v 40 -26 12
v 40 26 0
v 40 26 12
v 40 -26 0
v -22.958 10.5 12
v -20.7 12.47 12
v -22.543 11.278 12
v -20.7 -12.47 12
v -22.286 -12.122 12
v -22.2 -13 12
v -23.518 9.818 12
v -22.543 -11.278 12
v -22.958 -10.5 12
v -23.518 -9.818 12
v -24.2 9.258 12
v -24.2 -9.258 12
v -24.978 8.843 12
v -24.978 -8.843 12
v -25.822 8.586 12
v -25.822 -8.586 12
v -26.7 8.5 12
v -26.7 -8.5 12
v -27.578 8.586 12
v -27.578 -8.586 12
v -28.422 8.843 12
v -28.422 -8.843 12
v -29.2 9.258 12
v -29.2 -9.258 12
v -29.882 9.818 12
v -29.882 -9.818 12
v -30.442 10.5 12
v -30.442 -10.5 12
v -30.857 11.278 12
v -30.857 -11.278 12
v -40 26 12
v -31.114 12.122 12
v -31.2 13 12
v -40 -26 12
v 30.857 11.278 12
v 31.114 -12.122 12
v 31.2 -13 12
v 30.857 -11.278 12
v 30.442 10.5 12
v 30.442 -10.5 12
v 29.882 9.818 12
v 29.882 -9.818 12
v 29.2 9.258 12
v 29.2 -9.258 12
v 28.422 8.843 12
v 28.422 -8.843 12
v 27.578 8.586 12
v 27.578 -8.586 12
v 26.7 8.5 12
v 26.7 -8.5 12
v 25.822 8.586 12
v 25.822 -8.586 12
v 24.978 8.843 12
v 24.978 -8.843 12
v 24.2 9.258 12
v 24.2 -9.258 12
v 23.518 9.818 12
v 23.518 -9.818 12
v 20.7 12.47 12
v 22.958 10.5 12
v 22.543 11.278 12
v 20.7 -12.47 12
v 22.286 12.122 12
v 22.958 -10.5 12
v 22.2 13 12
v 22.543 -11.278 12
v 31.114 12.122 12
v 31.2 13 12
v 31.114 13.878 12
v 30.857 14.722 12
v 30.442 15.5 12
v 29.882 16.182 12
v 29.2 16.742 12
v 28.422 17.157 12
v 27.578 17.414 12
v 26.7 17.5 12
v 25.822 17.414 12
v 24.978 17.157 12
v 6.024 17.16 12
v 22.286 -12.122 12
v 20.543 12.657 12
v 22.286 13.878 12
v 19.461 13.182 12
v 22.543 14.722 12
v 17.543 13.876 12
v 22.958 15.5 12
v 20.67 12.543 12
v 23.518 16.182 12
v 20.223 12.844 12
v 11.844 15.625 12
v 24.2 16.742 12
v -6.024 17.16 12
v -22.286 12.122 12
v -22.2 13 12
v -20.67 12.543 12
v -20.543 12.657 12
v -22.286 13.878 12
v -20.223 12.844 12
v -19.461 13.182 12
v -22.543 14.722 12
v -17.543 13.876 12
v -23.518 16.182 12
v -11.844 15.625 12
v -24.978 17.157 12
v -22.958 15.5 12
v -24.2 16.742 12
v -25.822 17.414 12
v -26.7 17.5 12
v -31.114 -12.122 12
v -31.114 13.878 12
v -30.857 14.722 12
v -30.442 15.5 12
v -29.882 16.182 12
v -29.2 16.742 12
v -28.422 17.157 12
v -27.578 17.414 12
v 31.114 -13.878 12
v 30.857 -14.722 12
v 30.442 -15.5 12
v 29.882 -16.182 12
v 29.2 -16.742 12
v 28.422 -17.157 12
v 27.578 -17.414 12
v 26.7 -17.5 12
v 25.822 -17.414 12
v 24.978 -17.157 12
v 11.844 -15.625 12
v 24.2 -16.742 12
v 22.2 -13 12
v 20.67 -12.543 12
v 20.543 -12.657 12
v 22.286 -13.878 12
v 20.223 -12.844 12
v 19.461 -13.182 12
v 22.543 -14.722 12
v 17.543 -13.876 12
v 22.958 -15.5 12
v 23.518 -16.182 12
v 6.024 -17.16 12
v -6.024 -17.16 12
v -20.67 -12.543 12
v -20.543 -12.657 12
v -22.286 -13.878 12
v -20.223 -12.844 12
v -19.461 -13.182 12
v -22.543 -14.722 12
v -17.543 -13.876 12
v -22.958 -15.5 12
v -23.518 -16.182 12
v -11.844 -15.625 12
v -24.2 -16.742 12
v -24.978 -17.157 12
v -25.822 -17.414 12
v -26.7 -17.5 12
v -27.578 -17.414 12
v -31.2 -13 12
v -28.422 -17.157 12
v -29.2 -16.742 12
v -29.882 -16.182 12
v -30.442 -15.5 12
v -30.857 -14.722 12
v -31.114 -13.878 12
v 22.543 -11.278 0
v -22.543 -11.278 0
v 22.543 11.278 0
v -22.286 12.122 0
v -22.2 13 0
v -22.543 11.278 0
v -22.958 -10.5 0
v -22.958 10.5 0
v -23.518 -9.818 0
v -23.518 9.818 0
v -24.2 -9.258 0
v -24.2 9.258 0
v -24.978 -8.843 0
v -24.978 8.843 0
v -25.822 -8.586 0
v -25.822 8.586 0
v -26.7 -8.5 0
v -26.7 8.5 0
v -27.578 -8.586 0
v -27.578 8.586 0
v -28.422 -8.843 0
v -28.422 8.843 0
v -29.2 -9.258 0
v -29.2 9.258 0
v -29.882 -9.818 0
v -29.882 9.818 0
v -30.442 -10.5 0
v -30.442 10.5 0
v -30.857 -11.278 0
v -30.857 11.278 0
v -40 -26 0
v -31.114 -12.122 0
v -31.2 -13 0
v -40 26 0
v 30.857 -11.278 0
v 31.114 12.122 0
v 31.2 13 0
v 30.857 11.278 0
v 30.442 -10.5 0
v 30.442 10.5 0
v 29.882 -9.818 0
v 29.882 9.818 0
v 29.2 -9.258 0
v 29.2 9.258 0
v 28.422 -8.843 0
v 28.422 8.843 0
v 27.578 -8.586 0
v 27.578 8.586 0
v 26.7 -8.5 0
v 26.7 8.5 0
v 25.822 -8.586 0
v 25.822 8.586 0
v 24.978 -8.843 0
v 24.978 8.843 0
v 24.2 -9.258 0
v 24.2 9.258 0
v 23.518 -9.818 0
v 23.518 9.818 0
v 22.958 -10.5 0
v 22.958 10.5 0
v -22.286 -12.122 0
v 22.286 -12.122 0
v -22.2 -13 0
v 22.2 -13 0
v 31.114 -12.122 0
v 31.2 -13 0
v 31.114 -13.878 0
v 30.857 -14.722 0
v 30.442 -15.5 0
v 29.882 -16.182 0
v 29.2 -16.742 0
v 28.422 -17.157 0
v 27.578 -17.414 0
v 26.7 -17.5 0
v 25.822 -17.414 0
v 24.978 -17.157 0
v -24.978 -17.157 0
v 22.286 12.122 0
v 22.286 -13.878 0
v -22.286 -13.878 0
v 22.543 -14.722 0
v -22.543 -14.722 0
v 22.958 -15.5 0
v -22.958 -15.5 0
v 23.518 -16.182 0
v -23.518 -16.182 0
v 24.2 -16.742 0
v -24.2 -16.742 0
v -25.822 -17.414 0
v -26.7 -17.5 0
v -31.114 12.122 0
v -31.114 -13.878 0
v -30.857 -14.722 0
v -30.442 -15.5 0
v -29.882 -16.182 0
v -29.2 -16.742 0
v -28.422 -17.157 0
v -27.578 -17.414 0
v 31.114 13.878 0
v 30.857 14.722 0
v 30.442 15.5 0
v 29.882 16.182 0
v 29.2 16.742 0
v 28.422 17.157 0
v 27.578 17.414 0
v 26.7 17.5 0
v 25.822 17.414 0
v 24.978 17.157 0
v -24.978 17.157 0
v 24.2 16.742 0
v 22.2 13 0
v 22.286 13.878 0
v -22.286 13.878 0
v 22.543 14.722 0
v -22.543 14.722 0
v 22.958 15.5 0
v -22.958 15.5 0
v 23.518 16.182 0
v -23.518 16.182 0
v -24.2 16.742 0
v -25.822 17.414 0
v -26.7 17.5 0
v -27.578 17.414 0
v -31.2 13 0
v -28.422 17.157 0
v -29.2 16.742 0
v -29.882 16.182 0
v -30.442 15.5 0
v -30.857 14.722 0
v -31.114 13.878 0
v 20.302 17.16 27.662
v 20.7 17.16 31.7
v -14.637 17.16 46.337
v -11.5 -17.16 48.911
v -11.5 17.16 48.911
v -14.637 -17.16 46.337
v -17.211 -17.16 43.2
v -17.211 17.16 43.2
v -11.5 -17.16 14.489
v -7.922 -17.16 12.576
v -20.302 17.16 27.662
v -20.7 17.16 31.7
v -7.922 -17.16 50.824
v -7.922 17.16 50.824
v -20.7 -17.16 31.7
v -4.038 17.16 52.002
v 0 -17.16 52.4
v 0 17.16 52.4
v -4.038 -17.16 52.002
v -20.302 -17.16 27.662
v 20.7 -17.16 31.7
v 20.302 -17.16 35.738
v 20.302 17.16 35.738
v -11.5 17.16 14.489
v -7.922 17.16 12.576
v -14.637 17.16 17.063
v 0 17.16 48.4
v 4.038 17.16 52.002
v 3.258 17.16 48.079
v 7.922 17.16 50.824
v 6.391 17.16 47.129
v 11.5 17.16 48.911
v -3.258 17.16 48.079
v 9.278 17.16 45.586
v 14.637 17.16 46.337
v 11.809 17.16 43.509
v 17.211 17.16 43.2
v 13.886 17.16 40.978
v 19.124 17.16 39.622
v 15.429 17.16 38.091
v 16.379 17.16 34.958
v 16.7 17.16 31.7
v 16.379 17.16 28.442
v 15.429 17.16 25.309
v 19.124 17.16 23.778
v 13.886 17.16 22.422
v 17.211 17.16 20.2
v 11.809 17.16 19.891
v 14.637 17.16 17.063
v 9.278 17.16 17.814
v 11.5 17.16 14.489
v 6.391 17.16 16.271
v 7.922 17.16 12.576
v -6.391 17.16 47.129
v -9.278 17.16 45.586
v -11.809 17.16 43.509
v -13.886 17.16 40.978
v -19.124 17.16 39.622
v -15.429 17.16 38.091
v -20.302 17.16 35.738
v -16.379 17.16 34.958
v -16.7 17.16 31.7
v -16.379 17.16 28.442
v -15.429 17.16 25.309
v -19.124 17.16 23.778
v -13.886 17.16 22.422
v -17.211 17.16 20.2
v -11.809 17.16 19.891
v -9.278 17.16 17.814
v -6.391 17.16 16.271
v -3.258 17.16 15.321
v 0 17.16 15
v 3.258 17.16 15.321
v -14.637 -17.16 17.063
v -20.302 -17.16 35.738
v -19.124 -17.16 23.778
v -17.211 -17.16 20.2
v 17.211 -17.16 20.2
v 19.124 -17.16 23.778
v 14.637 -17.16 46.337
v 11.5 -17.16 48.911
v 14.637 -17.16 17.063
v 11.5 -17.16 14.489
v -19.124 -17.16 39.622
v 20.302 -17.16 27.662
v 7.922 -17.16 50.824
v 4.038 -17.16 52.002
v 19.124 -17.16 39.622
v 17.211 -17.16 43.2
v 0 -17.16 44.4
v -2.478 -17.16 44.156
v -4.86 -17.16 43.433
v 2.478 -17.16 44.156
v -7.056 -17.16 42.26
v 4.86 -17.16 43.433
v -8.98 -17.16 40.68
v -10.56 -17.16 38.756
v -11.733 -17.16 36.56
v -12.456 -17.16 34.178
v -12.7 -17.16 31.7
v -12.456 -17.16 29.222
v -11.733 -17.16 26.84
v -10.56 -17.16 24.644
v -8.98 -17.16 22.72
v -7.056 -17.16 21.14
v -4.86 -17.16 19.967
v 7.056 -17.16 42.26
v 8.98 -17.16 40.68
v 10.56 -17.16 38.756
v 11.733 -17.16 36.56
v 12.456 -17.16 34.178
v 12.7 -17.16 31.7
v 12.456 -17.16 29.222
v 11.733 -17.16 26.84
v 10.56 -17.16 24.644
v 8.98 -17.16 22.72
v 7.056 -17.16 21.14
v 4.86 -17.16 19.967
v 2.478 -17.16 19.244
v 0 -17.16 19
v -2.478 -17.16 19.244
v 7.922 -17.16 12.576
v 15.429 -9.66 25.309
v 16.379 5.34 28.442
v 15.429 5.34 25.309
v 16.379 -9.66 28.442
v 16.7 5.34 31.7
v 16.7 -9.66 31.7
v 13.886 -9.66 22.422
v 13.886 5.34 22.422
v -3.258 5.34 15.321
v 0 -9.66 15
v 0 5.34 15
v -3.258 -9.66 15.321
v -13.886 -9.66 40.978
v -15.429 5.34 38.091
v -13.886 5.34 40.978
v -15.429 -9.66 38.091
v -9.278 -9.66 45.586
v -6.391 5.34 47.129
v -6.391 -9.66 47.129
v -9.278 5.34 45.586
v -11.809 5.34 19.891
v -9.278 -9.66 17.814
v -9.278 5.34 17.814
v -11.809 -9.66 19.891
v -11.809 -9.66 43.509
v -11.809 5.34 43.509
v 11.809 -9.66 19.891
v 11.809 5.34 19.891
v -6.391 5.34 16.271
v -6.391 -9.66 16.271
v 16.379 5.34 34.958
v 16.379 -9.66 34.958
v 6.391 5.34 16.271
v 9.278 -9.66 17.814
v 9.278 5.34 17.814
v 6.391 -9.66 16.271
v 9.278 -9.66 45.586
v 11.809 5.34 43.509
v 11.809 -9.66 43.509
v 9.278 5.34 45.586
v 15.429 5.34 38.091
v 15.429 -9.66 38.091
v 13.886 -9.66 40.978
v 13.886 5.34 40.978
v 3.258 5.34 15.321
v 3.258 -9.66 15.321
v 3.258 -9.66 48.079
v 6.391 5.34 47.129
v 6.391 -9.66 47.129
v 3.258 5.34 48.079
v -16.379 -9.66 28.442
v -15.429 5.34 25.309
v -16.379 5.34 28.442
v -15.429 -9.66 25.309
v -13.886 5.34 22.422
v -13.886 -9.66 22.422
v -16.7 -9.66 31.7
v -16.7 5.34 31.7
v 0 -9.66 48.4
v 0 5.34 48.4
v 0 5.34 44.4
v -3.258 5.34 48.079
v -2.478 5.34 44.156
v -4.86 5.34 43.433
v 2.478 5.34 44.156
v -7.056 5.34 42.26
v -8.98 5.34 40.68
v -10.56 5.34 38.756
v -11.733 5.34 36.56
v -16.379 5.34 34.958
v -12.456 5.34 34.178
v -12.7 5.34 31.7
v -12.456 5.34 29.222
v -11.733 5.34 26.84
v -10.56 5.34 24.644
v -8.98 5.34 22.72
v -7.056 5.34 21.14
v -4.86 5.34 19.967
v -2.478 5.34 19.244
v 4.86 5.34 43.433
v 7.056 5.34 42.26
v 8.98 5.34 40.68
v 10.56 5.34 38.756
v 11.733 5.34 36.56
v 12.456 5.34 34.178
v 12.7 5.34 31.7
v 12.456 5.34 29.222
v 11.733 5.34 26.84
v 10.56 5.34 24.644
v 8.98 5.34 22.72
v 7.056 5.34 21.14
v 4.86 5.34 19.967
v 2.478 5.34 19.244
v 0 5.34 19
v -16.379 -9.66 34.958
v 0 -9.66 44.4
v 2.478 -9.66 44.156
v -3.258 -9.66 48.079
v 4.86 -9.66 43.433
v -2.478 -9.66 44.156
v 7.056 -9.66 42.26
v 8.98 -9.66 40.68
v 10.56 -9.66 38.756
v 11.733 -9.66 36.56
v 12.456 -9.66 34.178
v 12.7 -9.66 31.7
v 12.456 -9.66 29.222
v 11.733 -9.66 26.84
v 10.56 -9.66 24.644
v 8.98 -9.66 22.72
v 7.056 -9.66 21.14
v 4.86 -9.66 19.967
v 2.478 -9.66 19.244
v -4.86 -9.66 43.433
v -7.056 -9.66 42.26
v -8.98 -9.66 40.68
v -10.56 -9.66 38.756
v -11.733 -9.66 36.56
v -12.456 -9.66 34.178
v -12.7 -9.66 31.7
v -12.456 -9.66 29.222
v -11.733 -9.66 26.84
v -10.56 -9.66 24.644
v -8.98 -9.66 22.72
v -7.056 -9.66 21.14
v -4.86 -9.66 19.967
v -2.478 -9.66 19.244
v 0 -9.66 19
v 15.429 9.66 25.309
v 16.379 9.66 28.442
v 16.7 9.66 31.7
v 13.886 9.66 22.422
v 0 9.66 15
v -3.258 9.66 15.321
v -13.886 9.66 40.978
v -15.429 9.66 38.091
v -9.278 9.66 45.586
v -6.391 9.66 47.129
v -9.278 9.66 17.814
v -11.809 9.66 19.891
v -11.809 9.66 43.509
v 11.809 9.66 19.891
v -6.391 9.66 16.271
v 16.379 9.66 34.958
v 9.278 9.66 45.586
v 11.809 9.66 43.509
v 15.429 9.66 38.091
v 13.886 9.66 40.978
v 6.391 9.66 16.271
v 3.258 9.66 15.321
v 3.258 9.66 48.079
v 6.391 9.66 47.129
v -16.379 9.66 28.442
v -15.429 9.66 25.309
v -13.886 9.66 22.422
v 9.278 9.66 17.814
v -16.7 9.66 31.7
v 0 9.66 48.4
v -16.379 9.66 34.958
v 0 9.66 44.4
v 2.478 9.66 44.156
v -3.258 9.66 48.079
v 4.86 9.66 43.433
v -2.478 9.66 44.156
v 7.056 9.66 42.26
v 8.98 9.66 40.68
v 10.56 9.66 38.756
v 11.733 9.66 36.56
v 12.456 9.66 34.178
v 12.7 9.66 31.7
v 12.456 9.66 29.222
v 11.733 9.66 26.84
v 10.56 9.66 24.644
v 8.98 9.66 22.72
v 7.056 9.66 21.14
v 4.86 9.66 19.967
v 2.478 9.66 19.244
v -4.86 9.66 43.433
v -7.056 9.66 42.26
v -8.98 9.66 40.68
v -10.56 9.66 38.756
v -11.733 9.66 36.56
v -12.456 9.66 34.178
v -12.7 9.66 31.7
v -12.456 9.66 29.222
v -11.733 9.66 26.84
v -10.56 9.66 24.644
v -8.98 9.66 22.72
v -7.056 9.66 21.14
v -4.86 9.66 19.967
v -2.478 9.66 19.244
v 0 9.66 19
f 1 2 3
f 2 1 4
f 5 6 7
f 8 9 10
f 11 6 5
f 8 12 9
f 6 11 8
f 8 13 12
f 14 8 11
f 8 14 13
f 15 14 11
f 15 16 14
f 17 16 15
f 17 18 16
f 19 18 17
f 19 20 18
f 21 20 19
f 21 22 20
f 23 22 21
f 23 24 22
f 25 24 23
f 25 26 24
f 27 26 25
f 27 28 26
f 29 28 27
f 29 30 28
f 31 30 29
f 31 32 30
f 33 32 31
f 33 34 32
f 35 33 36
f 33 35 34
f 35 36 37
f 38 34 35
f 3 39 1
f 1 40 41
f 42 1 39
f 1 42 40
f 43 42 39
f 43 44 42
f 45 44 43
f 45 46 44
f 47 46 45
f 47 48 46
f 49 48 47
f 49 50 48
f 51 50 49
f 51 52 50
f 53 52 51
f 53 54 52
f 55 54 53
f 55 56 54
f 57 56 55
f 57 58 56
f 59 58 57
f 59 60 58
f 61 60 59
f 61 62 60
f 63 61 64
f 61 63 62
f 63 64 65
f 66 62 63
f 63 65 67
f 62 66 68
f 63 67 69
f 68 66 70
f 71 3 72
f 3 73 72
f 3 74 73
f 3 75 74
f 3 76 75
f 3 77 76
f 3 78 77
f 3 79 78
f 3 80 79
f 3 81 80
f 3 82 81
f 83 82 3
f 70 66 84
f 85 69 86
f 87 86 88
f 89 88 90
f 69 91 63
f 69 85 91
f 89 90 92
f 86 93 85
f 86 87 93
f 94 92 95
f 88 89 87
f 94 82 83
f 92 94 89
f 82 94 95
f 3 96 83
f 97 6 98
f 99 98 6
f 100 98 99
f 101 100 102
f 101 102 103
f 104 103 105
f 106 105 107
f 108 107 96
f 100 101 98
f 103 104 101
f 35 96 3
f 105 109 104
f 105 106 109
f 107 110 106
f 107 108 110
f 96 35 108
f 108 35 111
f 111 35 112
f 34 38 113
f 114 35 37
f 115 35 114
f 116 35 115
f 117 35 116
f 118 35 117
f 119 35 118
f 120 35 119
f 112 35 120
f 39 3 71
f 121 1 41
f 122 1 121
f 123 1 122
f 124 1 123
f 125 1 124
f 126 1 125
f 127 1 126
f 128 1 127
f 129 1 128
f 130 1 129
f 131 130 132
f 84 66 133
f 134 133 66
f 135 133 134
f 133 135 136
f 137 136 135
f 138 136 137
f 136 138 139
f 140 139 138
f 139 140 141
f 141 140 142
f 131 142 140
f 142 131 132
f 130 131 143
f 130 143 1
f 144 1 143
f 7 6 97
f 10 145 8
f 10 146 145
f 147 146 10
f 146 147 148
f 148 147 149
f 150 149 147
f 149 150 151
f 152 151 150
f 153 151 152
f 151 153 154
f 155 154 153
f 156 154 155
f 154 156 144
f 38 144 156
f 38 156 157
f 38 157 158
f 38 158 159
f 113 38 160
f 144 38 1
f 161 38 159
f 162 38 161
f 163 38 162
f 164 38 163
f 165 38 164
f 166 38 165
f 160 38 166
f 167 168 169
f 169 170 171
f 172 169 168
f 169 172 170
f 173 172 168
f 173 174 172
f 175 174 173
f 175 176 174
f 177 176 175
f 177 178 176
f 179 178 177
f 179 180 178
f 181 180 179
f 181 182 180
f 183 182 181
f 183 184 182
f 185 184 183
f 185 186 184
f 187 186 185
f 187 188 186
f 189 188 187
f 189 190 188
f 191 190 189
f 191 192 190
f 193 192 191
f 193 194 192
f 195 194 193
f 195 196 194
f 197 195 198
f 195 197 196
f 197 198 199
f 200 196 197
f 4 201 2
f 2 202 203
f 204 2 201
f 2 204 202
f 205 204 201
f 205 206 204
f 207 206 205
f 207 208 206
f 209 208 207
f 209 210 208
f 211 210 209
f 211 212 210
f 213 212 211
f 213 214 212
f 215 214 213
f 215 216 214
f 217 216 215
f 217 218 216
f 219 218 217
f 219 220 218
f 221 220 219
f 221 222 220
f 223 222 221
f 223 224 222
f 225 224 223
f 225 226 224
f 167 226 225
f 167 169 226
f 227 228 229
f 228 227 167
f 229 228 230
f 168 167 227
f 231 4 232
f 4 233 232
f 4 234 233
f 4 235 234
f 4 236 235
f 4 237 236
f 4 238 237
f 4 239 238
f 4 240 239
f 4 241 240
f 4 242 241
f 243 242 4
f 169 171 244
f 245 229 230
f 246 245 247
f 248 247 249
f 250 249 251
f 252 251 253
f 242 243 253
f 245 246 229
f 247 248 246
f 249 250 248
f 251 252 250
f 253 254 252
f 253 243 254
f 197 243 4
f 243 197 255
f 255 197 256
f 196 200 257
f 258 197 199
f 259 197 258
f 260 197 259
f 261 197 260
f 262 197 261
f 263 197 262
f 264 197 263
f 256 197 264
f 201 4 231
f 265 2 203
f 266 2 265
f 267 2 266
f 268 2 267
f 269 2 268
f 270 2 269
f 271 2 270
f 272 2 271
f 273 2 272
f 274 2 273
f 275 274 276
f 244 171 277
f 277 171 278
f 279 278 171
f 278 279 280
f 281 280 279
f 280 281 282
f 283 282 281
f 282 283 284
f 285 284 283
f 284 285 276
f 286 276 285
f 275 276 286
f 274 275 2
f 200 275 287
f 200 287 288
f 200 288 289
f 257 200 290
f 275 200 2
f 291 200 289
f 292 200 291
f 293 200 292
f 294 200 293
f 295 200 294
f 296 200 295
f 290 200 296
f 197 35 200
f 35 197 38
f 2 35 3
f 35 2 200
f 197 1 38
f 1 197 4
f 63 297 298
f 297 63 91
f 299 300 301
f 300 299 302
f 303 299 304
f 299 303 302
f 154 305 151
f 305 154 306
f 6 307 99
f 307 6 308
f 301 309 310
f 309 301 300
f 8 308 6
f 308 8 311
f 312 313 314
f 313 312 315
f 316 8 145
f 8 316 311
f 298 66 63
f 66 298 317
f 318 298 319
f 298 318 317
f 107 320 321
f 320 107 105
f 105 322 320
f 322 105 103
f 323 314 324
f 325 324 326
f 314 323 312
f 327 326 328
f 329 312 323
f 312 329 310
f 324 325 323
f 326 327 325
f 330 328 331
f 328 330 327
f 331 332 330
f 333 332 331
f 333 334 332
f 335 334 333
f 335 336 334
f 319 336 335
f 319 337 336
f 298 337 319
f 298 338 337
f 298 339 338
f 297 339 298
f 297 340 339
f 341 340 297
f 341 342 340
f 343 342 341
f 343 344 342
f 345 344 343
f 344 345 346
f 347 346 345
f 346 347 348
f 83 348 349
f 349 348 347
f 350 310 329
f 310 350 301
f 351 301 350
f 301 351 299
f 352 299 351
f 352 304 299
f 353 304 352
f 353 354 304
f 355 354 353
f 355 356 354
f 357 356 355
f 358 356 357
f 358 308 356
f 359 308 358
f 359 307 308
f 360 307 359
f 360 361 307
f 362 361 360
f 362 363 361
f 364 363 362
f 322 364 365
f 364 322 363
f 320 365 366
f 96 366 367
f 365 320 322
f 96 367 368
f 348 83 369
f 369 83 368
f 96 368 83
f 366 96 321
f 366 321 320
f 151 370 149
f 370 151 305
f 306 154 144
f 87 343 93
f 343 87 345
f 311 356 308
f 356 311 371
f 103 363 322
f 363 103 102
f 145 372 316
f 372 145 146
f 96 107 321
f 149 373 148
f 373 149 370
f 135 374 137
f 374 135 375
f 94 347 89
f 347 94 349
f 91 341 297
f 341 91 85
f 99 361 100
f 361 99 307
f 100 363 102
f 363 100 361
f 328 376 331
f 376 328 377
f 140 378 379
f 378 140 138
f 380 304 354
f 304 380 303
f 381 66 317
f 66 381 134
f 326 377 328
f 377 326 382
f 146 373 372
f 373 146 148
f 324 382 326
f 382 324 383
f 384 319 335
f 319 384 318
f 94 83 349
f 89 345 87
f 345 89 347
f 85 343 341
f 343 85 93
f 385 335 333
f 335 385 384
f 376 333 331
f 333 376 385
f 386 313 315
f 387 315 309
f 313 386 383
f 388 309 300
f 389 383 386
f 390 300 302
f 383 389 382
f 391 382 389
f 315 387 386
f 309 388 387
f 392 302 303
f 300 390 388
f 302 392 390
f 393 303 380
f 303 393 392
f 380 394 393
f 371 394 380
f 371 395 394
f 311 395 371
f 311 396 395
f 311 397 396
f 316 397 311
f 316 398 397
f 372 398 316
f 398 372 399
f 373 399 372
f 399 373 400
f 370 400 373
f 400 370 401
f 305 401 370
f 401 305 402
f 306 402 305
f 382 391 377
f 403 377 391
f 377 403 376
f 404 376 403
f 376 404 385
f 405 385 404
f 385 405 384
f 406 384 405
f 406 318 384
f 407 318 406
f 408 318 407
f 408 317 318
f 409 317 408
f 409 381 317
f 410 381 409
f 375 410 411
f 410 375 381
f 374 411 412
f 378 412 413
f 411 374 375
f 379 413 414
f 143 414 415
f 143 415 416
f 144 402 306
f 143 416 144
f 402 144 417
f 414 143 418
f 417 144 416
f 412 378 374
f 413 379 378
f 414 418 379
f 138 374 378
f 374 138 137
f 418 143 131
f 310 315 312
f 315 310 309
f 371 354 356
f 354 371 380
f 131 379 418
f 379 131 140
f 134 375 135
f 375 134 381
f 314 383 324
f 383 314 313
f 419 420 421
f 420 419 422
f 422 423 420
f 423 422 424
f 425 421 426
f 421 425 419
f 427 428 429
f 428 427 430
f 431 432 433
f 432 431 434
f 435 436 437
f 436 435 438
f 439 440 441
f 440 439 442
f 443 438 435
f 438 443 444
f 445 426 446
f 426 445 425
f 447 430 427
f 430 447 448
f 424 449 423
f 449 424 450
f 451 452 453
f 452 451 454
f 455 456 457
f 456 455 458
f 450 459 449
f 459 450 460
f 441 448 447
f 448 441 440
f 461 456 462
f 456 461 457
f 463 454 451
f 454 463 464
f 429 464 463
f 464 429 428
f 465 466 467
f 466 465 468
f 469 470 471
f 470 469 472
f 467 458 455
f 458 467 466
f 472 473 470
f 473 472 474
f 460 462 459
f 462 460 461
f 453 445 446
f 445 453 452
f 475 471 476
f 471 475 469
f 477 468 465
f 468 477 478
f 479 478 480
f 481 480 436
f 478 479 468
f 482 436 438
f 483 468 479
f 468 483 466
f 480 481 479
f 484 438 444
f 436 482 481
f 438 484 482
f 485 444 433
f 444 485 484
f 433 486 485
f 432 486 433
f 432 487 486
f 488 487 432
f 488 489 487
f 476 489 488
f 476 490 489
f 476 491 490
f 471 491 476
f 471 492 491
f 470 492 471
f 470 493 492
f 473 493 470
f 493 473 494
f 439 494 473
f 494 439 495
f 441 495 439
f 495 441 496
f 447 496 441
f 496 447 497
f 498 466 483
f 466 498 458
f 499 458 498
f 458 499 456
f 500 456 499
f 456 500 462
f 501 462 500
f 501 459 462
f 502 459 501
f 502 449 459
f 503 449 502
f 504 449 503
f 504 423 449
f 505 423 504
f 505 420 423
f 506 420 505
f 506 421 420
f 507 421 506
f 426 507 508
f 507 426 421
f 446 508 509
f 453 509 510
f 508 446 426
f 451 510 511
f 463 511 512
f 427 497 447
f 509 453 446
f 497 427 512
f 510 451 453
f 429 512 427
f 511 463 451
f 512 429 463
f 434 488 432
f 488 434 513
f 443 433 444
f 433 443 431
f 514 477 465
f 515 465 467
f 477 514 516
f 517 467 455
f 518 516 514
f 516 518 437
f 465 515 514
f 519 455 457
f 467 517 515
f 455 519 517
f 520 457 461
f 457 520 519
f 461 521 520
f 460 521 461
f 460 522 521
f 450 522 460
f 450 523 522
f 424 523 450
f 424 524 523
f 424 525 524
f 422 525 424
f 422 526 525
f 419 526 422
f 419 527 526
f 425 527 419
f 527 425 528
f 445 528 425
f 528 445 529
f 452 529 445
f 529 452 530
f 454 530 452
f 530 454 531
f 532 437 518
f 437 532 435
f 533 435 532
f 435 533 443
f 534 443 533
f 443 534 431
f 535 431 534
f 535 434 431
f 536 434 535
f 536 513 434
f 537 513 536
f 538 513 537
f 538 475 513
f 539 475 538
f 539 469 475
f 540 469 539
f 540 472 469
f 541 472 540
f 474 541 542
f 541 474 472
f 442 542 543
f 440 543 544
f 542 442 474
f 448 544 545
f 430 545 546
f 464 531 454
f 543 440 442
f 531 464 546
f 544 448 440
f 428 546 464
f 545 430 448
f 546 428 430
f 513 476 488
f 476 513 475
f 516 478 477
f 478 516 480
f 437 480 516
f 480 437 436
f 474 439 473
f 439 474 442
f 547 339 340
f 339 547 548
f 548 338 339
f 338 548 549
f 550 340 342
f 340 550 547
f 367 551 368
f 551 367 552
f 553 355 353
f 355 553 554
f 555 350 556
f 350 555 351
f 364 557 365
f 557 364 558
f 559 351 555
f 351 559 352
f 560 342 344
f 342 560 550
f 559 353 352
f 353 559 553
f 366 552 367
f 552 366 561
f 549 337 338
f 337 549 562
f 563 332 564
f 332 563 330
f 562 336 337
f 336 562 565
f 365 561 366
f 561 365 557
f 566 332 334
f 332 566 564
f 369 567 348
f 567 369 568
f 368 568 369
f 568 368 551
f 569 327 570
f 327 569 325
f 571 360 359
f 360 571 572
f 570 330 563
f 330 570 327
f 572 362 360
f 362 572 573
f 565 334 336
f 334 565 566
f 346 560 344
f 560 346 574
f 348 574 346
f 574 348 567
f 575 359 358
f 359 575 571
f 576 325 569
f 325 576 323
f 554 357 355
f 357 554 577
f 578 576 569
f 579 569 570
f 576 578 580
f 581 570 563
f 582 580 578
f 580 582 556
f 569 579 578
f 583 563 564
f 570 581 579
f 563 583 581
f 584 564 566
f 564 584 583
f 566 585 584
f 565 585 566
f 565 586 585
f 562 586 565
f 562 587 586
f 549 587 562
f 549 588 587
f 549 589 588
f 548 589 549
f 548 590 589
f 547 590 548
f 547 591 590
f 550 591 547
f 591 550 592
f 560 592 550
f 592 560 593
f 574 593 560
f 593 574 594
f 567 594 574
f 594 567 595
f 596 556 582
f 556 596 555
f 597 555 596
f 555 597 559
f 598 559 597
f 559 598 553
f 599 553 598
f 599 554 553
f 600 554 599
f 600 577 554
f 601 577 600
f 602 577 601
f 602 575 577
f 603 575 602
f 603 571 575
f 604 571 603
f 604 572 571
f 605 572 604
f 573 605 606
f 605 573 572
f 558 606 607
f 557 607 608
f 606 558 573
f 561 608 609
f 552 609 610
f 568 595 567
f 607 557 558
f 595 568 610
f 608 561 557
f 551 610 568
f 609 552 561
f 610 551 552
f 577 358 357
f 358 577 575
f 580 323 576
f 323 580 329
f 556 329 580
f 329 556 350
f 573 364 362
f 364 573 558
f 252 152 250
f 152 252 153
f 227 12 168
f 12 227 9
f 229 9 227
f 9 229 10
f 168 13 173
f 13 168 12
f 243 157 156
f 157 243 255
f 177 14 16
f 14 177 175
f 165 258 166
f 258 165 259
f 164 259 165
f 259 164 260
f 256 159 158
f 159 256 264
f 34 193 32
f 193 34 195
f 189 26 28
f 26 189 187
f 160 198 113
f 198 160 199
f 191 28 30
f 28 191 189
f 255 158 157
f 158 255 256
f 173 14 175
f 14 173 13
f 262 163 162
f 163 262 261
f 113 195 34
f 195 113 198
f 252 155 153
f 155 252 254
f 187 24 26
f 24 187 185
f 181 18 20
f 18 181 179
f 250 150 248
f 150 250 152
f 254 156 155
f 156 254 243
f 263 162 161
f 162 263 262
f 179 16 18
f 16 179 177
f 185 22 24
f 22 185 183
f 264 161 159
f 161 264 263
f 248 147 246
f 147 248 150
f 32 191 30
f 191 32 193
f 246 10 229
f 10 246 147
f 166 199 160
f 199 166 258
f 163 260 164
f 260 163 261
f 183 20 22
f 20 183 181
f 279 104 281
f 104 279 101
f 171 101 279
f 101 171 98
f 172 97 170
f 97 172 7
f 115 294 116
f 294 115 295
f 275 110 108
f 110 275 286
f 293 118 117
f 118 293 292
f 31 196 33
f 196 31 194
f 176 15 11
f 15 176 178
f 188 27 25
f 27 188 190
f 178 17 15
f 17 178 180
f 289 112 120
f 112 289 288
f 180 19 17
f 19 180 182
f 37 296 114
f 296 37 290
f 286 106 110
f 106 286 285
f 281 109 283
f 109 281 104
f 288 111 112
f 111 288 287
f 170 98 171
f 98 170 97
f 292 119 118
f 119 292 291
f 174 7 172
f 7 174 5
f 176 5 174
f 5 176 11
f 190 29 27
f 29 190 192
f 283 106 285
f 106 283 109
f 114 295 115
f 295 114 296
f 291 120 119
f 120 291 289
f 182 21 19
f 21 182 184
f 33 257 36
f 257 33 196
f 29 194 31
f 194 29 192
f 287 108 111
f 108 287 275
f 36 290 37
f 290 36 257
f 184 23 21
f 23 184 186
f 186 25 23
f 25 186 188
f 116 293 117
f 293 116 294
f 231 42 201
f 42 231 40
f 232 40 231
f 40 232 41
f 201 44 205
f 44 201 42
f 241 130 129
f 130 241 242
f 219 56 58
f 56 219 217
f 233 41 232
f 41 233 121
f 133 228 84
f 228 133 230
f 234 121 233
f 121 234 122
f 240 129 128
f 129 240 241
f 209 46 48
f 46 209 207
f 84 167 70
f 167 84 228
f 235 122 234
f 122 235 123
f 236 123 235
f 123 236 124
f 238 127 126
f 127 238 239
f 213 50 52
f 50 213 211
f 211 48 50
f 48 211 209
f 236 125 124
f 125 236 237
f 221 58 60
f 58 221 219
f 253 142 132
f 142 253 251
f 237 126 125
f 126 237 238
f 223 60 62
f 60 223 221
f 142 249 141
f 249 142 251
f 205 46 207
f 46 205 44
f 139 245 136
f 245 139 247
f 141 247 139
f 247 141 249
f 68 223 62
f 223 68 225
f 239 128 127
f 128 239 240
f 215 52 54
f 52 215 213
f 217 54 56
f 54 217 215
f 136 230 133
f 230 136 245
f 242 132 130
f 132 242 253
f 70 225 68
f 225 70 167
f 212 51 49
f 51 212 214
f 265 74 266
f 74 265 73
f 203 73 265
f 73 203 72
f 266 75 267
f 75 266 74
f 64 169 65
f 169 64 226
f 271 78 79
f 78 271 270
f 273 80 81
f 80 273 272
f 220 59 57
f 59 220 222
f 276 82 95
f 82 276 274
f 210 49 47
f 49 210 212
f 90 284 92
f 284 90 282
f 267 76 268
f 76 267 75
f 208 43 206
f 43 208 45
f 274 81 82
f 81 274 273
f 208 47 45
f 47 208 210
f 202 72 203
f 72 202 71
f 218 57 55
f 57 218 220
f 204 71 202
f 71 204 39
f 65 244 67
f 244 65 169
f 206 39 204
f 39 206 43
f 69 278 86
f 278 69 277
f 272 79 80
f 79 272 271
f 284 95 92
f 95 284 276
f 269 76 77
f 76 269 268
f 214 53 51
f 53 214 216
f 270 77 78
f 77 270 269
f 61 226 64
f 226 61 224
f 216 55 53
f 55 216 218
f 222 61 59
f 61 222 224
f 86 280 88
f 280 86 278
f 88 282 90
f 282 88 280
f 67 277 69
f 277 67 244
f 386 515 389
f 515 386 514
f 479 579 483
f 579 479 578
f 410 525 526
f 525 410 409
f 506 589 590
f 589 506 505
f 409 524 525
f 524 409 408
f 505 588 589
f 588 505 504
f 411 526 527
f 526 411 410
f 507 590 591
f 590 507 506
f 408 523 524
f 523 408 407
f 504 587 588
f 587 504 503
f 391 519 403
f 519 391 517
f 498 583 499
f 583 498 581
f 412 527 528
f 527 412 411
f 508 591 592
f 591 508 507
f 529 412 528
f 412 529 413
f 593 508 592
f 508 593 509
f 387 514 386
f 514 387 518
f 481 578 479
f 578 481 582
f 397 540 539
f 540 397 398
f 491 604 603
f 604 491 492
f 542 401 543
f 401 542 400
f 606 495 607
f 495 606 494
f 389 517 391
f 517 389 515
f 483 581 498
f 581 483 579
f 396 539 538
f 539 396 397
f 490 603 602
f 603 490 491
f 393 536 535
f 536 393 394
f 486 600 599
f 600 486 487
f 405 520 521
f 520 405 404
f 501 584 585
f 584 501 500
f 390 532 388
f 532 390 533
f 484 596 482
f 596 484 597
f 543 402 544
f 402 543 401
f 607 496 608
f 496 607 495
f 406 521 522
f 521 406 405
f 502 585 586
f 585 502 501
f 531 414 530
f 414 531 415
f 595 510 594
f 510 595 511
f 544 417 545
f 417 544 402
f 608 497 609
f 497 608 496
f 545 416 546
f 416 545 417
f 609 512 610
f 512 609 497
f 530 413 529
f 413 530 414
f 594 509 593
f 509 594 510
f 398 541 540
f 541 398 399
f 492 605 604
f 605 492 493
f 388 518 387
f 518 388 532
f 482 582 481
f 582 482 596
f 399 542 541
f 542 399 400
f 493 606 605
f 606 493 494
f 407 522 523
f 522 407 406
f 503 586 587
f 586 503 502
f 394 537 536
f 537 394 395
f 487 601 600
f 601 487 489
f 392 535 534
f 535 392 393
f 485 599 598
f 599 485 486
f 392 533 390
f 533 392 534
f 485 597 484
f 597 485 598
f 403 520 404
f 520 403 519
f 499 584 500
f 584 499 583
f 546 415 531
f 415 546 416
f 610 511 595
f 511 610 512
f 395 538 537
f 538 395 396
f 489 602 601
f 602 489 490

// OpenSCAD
$fn = 32;

// ----------------------------------------------------------------------
// Bearing block: 80 x 52 mm base, 25.4 mm bore at 31.7 mm
// ----------------------------------------------------------------------

// --- parameters (mm) ---
base_w = 80;              // base width
base_d = 52;              // base depth
base_t = 12;              // base thickness
bore_d = 25.4;            // shaft / bearing bore
house_r = 20.7;           // housing outer radius
house_len = 34.32;        // housing length along the shaft
foot_w = 41.4;            // foot width under the housing
foot_len = 24.32;         // foot length along the shaft
axis_z = 31.7;            // bore axis height above the base
holes_d = 9;              // mounting holes
hole_x = 26.7;            // mounting hole spacing
seat_d = 10;              // bearing seat depth
seat_wall = 4;            // seat wall thickness

difference() {
  union() {
    /* base plate with its underside on z = 0 */
    translate([0, 0, base_t / 2]) cube([base_w, base_d, base_t], center = true);
    /* hull foot: a straight web blending into the round housing */
    hull() {
      translate([0, 0, base_t - 0.5]) cube([foot_w, foot_len, 1.6], center = true);
      translate([0, 0, axis_z]) rotate([-90, 0, 0]) cylinder(h = house_len, d = 2 * house_r, center = true);
    }
  }
  /* bore through the housing, 2.5 mm clear on both sides */
  translate([0, 0, axis_z]) rotate([-90, 0, 0]) cylinder(h = house_len + 5, d = bore_d, center = true);
  /* bearing seats, recessed into both ends of the housing */
  for (sy = [-1, 1]) {
    translate([0, sy * (house_len / 2 - seat_d + 2.5), axis_z]) rotate([-90, 0, 0]) cylinder(h = seat_d + 5, d = bore_d + 2 * seat_wall);
  }
  /* mounting holes through the base plate */
  for (hx = [-26.7, 26.7]) {
    for (hy = [-13, 13]) {
      translate([hx, hy, -2.5]) cylinder(h = base_t + 5, d = holes_d);
    }
  }
}
